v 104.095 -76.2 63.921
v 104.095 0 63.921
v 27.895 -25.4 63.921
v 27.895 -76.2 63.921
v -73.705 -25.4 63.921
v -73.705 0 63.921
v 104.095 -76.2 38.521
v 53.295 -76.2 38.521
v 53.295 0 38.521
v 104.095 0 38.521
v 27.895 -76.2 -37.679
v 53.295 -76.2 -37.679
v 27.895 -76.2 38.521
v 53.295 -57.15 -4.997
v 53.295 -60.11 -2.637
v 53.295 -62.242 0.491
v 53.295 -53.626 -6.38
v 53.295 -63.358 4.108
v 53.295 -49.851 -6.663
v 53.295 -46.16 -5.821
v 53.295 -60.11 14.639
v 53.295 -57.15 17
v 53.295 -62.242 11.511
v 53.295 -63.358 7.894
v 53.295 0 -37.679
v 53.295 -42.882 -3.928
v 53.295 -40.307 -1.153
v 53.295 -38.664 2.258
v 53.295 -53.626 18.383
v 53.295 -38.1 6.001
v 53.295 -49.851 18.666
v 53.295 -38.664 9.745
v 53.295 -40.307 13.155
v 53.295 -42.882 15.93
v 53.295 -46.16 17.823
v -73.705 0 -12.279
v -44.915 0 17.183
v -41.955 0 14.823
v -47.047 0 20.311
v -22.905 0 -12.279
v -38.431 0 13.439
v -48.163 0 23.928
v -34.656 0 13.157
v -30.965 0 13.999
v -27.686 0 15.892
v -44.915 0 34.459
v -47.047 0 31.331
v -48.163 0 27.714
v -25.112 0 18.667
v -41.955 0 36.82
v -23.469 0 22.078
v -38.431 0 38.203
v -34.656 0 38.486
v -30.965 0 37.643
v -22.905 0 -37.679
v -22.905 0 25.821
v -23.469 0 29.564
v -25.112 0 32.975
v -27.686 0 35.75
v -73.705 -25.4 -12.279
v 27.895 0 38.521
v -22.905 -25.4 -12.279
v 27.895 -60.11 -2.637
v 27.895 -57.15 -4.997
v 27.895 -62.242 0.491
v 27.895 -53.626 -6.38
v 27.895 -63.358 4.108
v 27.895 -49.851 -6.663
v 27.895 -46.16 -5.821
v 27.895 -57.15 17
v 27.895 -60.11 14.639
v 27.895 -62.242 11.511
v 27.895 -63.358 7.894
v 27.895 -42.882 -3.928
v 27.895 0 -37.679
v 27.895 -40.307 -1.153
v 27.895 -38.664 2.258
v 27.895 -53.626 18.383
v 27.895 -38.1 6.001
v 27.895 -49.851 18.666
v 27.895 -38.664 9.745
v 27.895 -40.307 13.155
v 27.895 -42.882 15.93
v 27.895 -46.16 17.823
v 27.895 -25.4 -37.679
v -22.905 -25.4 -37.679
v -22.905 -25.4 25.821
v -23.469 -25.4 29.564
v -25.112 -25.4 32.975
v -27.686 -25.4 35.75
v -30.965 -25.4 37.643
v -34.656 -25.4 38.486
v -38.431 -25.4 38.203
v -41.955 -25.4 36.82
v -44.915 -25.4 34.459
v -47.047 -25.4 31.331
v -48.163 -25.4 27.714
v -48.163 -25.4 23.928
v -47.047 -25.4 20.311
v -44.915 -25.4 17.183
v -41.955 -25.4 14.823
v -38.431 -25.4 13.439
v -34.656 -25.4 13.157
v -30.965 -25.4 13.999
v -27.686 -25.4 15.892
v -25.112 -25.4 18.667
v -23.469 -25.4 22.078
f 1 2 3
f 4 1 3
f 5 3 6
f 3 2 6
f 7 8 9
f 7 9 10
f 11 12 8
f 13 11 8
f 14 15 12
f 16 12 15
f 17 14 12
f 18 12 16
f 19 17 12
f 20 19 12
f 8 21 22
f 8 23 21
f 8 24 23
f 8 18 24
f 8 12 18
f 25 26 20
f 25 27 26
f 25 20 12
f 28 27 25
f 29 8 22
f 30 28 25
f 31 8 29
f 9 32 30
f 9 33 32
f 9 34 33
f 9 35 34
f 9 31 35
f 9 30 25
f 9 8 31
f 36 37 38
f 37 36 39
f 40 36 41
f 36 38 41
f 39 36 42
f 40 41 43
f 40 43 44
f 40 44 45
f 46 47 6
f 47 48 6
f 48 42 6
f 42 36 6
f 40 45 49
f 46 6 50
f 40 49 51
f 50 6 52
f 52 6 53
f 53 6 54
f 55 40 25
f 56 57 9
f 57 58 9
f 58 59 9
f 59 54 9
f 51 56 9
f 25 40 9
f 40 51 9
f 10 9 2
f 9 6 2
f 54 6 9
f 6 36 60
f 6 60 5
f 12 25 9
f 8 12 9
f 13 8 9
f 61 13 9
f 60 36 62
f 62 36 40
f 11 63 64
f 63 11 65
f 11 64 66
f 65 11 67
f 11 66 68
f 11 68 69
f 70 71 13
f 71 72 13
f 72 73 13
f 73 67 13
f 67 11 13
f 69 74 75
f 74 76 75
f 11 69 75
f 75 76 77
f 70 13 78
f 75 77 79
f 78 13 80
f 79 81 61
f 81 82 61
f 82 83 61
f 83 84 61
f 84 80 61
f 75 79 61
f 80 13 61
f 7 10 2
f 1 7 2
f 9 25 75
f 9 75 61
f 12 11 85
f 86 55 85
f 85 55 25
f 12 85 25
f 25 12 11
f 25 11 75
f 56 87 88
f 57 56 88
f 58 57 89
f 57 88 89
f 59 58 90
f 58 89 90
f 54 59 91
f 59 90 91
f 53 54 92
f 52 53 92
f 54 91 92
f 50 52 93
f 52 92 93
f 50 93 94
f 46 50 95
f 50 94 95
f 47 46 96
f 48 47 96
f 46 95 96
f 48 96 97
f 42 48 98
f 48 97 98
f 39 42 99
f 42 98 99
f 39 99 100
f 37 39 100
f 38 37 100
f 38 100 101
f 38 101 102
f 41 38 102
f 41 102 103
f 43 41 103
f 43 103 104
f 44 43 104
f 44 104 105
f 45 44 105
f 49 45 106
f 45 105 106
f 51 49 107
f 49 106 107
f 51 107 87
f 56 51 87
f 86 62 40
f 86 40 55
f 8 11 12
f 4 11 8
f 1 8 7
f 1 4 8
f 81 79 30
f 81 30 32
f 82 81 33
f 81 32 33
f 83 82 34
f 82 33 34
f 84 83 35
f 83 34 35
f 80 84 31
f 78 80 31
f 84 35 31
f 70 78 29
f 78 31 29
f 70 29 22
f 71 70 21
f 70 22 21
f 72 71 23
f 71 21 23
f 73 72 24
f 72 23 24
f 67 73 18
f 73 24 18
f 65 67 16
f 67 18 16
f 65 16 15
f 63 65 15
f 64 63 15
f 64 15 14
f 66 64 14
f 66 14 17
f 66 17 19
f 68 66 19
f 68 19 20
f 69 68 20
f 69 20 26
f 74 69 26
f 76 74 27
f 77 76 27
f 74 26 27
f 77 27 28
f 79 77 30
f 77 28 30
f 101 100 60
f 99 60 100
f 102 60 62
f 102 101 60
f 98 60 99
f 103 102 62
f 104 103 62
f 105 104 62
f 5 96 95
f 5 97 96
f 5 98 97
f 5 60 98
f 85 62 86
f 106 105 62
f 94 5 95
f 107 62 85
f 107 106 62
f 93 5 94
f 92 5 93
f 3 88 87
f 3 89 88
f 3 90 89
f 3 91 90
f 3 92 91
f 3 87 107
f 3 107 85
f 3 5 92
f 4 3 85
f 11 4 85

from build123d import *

# Parameters (mm, degrees)
F0_W     = 50.8
F0_H     = 76.2
F1_DEPTH = 25.4
F0_H_2   = 25.4
F2_DEPTH = 76.2
F4_R     = 12.7
F5_DEPTH = 25.4
F3_W     = 76.2
F3_H     = 76.2
F3_R     = 12.7
F6_DEPTH = 25.4


with BuildPart() as f1:
    # F0 (on Front) → F1 (new body)
    with BuildSketch(Plane.XZ):
        with Locations((-48.304801, 25.821041)):
            Rectangle(F0_W, F0_H)
        Polygon((27.895199, 63.921041), (-22.904801, 63.921041), (-22.904801, -12.278959), (-22.904801, -37.678959), (27.895199, -37.678959), align=None)
    extrude(amount=F1_DEPTH)

    # F0 (on Front) → F2 (join)
    with BuildSketch(Plane.XZ):
        Polygon((53.295199, 63.921041), (27.895199, 63.921041), (27.895199, -37.678959), (53.295199, -37.678959), (53.295199, 38.521041), align=None)
        with Locations((78.695199, 51.221041)):
            Rectangle(F0_W, F0_H_2)
    extrude(amount=F2_DEPTH)

    # F4 (on face) → F5 (cut)
    with BuildSketch(Plane.XZ.offset(25.4)):
        with Locations((-35.604801, 25.821041)):
            Circle(F4_R)
    extrude(amount=-F5_DEPTH, mode=Mode.SUBTRACT)


with BuildPart() as f6:
    # F3 (on face) → F6 (new body)
    with BuildSketch(Plane.YZ.offset(53.295199)):
        with Locations((-38.1, 0.421041)):
            Rectangle(F3_W, F3_H)
        with Locations((-50.8, 6.001113)):
            Circle(F3_R, mode=Mode.SUBTRACT)
    extrude(amount=-F6_DEPTH)


solid = Compound([f1.part, f6.part])
